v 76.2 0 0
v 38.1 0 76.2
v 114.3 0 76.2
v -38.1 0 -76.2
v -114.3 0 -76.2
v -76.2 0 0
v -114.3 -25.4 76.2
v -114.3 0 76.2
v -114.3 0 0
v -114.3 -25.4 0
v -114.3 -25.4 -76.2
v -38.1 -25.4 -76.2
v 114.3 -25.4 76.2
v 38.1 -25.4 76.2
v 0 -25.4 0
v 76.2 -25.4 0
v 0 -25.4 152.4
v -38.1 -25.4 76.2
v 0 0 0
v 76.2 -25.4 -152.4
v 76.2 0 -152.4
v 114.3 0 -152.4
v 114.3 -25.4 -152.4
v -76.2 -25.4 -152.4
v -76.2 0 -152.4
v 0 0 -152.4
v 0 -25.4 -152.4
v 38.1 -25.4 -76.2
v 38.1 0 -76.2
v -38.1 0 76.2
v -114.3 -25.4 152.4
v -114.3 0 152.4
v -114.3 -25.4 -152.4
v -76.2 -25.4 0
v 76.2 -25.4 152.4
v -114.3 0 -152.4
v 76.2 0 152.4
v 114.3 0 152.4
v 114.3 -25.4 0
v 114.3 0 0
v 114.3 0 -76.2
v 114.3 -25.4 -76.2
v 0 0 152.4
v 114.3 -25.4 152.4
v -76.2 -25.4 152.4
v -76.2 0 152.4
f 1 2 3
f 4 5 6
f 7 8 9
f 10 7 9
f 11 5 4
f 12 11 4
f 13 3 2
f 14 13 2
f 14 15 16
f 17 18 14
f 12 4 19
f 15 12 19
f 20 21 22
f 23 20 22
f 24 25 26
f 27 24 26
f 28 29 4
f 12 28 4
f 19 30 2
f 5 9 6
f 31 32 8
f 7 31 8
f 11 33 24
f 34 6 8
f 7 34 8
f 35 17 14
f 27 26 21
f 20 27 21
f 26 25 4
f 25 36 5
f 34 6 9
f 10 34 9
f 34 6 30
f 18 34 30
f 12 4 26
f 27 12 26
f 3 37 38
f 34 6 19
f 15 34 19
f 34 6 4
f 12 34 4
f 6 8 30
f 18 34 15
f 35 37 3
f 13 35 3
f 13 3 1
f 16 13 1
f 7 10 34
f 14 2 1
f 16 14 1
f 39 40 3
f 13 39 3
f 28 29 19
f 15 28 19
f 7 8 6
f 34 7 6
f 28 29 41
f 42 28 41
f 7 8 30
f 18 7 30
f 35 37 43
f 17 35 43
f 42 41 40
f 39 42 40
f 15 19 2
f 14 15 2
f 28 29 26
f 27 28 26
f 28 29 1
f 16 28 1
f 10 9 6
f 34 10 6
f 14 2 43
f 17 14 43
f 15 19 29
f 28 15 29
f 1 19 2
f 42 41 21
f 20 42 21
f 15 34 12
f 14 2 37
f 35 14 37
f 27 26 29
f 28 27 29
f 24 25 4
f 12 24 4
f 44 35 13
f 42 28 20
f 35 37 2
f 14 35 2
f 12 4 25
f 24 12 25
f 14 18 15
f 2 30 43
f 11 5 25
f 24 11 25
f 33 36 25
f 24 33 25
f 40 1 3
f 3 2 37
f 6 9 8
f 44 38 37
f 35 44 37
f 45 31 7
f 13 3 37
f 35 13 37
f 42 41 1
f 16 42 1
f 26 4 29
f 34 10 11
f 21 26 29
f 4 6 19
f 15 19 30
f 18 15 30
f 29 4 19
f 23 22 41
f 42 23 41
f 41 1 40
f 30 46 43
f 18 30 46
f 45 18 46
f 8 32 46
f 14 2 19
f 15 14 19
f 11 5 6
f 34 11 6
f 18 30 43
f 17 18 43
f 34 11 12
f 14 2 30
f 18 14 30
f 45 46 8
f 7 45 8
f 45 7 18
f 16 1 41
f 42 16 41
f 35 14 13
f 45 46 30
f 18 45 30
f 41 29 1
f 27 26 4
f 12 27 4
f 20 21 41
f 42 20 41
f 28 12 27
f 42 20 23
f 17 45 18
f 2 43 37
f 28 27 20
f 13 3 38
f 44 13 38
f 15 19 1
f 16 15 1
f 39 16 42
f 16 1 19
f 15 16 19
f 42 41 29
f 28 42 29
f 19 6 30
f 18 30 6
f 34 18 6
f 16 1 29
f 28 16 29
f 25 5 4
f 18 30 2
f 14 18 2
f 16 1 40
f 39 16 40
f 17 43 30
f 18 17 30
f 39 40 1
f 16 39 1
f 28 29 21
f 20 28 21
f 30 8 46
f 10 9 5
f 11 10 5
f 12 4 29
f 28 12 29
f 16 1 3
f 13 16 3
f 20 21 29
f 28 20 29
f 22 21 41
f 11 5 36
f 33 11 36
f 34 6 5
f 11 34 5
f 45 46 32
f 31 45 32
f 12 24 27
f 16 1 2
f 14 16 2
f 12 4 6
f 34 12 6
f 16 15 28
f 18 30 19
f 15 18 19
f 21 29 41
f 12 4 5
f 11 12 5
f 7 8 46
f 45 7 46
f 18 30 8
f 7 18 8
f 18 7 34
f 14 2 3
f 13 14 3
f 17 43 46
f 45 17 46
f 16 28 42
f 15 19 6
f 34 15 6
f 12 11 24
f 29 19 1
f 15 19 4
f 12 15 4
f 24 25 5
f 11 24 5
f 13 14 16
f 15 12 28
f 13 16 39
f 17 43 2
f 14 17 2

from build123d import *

# Parameters (mm, degrees)
F1_DEPTH = 25.4
F2_DEPTH = 25.4
F3_DEPTH = 25.4


with BuildPart() as f1:
    # F0 (on Front) → F1 (new body)
    with BuildSketch(Plane.XZ):
        Polygon((-76.2, 152.4), (-114.3, 152.4), (-114.3, 76.2), align=None)
        Polygon((0, 152.4), (-76.2, 152.4), (-38.1, 76.2), align=None)
        Polygon((76.2, 152.4), (0, 152.4), (38.1, 76.2), align=None)
        Polygon((114.3, 152.4), (76.2, 152.4), (114.3, 76.2), align=None)
        Polygon((114.3, 0), (114.3, 76.2), (76.2, 0), align=None)
        Polygon((76.2, 0), (38.1, 76.2), (0, 0), align=None)
        Polygon((0, 0), (-38.1, 76.2), (-76.2, 0), align=None)
        Polygon((-76.2, 0), (-114.3, 76.2), (-114.3, 0), align=None)
        Polygon((-38.1, -76.2), (-76.2, 0), (-114.3, -76.2), align=None)
        Polygon((38.1, -76.2), (0, 0), (-38.1, -76.2), align=None)
        Polygon((114.3, -76.2), (76.2, 0), (38.1, -76.2), align=None)
        Polygon((114.3, -152.4), (114.3, -76.2), (76.2, -152.4), align=None)
        Polygon((76.2, -152.4), (38.1, -76.2), (0, -152.4), align=None)
        Polygon((0, -152.4), (-38.1, -76.2), (-76.2, -152.4), align=None)
        Polygon((-76.2, -152.4), (-114.3, -76.2), (-114.3, -152.4), align=None)
    extrude(amount=F1_DEPTH)


with BuildPart() as f2:
    # F0 (on Front) → F2 (new body)
    with BuildSketch(Plane.XZ):
        Polygon((-38.1, 76.2), (-76.2, 152.4), (-114.3, 76.2), align=None)
        Polygon((38.1, 76.2), (0, 152.4), (-38.1, 76.2), align=None)
        Polygon((114.3, 76.2), (76.2, 152.4), (38.1, 76.2), align=None)
        Polygon((114.3, 0), (76.2, 0), (114.3, -76.2), align=None)
        Polygon((76.2, 0), (0, 0), (38.1, -76.2), align=None)
        Polygon((0, 0), (-76.2, 0), (-38.1, -76.2), align=None)
        Polygon((-76.2, 0), (-114.3, 0), (-114.3, -76.2), align=None)
        Polygon((-38.1, -76.2), (-114.3, -76.2), (-76.2, -152.4), align=None)
        Polygon((38.1, -76.2), (-38.1, -76.2), (0, -152.4), align=None)
        Polygon((114.3, -76.2), (38.1, -76.2), (76.2, -152.4), align=None)
    extrude(amount=F2_DEPTH)


with BuildPart() as f3:
    # F0 (on Front) → F3 (new body)
    with BuildSketch(Plane.XZ):
        Polygon((-38.1, 76.2), (-114.3, 76.2), (-76.2, 0), align=None)
        Polygon((38.1, 76.2), (-38.1, 76.2), (0, 0), align=None)
        Polygon((114.3, 76.2), (38.1, 76.2), (76.2, 0), align=None)
    extrude(amount=F3_DEPTH)


solid = Compound([f1.part, f2.part, f3.part])
